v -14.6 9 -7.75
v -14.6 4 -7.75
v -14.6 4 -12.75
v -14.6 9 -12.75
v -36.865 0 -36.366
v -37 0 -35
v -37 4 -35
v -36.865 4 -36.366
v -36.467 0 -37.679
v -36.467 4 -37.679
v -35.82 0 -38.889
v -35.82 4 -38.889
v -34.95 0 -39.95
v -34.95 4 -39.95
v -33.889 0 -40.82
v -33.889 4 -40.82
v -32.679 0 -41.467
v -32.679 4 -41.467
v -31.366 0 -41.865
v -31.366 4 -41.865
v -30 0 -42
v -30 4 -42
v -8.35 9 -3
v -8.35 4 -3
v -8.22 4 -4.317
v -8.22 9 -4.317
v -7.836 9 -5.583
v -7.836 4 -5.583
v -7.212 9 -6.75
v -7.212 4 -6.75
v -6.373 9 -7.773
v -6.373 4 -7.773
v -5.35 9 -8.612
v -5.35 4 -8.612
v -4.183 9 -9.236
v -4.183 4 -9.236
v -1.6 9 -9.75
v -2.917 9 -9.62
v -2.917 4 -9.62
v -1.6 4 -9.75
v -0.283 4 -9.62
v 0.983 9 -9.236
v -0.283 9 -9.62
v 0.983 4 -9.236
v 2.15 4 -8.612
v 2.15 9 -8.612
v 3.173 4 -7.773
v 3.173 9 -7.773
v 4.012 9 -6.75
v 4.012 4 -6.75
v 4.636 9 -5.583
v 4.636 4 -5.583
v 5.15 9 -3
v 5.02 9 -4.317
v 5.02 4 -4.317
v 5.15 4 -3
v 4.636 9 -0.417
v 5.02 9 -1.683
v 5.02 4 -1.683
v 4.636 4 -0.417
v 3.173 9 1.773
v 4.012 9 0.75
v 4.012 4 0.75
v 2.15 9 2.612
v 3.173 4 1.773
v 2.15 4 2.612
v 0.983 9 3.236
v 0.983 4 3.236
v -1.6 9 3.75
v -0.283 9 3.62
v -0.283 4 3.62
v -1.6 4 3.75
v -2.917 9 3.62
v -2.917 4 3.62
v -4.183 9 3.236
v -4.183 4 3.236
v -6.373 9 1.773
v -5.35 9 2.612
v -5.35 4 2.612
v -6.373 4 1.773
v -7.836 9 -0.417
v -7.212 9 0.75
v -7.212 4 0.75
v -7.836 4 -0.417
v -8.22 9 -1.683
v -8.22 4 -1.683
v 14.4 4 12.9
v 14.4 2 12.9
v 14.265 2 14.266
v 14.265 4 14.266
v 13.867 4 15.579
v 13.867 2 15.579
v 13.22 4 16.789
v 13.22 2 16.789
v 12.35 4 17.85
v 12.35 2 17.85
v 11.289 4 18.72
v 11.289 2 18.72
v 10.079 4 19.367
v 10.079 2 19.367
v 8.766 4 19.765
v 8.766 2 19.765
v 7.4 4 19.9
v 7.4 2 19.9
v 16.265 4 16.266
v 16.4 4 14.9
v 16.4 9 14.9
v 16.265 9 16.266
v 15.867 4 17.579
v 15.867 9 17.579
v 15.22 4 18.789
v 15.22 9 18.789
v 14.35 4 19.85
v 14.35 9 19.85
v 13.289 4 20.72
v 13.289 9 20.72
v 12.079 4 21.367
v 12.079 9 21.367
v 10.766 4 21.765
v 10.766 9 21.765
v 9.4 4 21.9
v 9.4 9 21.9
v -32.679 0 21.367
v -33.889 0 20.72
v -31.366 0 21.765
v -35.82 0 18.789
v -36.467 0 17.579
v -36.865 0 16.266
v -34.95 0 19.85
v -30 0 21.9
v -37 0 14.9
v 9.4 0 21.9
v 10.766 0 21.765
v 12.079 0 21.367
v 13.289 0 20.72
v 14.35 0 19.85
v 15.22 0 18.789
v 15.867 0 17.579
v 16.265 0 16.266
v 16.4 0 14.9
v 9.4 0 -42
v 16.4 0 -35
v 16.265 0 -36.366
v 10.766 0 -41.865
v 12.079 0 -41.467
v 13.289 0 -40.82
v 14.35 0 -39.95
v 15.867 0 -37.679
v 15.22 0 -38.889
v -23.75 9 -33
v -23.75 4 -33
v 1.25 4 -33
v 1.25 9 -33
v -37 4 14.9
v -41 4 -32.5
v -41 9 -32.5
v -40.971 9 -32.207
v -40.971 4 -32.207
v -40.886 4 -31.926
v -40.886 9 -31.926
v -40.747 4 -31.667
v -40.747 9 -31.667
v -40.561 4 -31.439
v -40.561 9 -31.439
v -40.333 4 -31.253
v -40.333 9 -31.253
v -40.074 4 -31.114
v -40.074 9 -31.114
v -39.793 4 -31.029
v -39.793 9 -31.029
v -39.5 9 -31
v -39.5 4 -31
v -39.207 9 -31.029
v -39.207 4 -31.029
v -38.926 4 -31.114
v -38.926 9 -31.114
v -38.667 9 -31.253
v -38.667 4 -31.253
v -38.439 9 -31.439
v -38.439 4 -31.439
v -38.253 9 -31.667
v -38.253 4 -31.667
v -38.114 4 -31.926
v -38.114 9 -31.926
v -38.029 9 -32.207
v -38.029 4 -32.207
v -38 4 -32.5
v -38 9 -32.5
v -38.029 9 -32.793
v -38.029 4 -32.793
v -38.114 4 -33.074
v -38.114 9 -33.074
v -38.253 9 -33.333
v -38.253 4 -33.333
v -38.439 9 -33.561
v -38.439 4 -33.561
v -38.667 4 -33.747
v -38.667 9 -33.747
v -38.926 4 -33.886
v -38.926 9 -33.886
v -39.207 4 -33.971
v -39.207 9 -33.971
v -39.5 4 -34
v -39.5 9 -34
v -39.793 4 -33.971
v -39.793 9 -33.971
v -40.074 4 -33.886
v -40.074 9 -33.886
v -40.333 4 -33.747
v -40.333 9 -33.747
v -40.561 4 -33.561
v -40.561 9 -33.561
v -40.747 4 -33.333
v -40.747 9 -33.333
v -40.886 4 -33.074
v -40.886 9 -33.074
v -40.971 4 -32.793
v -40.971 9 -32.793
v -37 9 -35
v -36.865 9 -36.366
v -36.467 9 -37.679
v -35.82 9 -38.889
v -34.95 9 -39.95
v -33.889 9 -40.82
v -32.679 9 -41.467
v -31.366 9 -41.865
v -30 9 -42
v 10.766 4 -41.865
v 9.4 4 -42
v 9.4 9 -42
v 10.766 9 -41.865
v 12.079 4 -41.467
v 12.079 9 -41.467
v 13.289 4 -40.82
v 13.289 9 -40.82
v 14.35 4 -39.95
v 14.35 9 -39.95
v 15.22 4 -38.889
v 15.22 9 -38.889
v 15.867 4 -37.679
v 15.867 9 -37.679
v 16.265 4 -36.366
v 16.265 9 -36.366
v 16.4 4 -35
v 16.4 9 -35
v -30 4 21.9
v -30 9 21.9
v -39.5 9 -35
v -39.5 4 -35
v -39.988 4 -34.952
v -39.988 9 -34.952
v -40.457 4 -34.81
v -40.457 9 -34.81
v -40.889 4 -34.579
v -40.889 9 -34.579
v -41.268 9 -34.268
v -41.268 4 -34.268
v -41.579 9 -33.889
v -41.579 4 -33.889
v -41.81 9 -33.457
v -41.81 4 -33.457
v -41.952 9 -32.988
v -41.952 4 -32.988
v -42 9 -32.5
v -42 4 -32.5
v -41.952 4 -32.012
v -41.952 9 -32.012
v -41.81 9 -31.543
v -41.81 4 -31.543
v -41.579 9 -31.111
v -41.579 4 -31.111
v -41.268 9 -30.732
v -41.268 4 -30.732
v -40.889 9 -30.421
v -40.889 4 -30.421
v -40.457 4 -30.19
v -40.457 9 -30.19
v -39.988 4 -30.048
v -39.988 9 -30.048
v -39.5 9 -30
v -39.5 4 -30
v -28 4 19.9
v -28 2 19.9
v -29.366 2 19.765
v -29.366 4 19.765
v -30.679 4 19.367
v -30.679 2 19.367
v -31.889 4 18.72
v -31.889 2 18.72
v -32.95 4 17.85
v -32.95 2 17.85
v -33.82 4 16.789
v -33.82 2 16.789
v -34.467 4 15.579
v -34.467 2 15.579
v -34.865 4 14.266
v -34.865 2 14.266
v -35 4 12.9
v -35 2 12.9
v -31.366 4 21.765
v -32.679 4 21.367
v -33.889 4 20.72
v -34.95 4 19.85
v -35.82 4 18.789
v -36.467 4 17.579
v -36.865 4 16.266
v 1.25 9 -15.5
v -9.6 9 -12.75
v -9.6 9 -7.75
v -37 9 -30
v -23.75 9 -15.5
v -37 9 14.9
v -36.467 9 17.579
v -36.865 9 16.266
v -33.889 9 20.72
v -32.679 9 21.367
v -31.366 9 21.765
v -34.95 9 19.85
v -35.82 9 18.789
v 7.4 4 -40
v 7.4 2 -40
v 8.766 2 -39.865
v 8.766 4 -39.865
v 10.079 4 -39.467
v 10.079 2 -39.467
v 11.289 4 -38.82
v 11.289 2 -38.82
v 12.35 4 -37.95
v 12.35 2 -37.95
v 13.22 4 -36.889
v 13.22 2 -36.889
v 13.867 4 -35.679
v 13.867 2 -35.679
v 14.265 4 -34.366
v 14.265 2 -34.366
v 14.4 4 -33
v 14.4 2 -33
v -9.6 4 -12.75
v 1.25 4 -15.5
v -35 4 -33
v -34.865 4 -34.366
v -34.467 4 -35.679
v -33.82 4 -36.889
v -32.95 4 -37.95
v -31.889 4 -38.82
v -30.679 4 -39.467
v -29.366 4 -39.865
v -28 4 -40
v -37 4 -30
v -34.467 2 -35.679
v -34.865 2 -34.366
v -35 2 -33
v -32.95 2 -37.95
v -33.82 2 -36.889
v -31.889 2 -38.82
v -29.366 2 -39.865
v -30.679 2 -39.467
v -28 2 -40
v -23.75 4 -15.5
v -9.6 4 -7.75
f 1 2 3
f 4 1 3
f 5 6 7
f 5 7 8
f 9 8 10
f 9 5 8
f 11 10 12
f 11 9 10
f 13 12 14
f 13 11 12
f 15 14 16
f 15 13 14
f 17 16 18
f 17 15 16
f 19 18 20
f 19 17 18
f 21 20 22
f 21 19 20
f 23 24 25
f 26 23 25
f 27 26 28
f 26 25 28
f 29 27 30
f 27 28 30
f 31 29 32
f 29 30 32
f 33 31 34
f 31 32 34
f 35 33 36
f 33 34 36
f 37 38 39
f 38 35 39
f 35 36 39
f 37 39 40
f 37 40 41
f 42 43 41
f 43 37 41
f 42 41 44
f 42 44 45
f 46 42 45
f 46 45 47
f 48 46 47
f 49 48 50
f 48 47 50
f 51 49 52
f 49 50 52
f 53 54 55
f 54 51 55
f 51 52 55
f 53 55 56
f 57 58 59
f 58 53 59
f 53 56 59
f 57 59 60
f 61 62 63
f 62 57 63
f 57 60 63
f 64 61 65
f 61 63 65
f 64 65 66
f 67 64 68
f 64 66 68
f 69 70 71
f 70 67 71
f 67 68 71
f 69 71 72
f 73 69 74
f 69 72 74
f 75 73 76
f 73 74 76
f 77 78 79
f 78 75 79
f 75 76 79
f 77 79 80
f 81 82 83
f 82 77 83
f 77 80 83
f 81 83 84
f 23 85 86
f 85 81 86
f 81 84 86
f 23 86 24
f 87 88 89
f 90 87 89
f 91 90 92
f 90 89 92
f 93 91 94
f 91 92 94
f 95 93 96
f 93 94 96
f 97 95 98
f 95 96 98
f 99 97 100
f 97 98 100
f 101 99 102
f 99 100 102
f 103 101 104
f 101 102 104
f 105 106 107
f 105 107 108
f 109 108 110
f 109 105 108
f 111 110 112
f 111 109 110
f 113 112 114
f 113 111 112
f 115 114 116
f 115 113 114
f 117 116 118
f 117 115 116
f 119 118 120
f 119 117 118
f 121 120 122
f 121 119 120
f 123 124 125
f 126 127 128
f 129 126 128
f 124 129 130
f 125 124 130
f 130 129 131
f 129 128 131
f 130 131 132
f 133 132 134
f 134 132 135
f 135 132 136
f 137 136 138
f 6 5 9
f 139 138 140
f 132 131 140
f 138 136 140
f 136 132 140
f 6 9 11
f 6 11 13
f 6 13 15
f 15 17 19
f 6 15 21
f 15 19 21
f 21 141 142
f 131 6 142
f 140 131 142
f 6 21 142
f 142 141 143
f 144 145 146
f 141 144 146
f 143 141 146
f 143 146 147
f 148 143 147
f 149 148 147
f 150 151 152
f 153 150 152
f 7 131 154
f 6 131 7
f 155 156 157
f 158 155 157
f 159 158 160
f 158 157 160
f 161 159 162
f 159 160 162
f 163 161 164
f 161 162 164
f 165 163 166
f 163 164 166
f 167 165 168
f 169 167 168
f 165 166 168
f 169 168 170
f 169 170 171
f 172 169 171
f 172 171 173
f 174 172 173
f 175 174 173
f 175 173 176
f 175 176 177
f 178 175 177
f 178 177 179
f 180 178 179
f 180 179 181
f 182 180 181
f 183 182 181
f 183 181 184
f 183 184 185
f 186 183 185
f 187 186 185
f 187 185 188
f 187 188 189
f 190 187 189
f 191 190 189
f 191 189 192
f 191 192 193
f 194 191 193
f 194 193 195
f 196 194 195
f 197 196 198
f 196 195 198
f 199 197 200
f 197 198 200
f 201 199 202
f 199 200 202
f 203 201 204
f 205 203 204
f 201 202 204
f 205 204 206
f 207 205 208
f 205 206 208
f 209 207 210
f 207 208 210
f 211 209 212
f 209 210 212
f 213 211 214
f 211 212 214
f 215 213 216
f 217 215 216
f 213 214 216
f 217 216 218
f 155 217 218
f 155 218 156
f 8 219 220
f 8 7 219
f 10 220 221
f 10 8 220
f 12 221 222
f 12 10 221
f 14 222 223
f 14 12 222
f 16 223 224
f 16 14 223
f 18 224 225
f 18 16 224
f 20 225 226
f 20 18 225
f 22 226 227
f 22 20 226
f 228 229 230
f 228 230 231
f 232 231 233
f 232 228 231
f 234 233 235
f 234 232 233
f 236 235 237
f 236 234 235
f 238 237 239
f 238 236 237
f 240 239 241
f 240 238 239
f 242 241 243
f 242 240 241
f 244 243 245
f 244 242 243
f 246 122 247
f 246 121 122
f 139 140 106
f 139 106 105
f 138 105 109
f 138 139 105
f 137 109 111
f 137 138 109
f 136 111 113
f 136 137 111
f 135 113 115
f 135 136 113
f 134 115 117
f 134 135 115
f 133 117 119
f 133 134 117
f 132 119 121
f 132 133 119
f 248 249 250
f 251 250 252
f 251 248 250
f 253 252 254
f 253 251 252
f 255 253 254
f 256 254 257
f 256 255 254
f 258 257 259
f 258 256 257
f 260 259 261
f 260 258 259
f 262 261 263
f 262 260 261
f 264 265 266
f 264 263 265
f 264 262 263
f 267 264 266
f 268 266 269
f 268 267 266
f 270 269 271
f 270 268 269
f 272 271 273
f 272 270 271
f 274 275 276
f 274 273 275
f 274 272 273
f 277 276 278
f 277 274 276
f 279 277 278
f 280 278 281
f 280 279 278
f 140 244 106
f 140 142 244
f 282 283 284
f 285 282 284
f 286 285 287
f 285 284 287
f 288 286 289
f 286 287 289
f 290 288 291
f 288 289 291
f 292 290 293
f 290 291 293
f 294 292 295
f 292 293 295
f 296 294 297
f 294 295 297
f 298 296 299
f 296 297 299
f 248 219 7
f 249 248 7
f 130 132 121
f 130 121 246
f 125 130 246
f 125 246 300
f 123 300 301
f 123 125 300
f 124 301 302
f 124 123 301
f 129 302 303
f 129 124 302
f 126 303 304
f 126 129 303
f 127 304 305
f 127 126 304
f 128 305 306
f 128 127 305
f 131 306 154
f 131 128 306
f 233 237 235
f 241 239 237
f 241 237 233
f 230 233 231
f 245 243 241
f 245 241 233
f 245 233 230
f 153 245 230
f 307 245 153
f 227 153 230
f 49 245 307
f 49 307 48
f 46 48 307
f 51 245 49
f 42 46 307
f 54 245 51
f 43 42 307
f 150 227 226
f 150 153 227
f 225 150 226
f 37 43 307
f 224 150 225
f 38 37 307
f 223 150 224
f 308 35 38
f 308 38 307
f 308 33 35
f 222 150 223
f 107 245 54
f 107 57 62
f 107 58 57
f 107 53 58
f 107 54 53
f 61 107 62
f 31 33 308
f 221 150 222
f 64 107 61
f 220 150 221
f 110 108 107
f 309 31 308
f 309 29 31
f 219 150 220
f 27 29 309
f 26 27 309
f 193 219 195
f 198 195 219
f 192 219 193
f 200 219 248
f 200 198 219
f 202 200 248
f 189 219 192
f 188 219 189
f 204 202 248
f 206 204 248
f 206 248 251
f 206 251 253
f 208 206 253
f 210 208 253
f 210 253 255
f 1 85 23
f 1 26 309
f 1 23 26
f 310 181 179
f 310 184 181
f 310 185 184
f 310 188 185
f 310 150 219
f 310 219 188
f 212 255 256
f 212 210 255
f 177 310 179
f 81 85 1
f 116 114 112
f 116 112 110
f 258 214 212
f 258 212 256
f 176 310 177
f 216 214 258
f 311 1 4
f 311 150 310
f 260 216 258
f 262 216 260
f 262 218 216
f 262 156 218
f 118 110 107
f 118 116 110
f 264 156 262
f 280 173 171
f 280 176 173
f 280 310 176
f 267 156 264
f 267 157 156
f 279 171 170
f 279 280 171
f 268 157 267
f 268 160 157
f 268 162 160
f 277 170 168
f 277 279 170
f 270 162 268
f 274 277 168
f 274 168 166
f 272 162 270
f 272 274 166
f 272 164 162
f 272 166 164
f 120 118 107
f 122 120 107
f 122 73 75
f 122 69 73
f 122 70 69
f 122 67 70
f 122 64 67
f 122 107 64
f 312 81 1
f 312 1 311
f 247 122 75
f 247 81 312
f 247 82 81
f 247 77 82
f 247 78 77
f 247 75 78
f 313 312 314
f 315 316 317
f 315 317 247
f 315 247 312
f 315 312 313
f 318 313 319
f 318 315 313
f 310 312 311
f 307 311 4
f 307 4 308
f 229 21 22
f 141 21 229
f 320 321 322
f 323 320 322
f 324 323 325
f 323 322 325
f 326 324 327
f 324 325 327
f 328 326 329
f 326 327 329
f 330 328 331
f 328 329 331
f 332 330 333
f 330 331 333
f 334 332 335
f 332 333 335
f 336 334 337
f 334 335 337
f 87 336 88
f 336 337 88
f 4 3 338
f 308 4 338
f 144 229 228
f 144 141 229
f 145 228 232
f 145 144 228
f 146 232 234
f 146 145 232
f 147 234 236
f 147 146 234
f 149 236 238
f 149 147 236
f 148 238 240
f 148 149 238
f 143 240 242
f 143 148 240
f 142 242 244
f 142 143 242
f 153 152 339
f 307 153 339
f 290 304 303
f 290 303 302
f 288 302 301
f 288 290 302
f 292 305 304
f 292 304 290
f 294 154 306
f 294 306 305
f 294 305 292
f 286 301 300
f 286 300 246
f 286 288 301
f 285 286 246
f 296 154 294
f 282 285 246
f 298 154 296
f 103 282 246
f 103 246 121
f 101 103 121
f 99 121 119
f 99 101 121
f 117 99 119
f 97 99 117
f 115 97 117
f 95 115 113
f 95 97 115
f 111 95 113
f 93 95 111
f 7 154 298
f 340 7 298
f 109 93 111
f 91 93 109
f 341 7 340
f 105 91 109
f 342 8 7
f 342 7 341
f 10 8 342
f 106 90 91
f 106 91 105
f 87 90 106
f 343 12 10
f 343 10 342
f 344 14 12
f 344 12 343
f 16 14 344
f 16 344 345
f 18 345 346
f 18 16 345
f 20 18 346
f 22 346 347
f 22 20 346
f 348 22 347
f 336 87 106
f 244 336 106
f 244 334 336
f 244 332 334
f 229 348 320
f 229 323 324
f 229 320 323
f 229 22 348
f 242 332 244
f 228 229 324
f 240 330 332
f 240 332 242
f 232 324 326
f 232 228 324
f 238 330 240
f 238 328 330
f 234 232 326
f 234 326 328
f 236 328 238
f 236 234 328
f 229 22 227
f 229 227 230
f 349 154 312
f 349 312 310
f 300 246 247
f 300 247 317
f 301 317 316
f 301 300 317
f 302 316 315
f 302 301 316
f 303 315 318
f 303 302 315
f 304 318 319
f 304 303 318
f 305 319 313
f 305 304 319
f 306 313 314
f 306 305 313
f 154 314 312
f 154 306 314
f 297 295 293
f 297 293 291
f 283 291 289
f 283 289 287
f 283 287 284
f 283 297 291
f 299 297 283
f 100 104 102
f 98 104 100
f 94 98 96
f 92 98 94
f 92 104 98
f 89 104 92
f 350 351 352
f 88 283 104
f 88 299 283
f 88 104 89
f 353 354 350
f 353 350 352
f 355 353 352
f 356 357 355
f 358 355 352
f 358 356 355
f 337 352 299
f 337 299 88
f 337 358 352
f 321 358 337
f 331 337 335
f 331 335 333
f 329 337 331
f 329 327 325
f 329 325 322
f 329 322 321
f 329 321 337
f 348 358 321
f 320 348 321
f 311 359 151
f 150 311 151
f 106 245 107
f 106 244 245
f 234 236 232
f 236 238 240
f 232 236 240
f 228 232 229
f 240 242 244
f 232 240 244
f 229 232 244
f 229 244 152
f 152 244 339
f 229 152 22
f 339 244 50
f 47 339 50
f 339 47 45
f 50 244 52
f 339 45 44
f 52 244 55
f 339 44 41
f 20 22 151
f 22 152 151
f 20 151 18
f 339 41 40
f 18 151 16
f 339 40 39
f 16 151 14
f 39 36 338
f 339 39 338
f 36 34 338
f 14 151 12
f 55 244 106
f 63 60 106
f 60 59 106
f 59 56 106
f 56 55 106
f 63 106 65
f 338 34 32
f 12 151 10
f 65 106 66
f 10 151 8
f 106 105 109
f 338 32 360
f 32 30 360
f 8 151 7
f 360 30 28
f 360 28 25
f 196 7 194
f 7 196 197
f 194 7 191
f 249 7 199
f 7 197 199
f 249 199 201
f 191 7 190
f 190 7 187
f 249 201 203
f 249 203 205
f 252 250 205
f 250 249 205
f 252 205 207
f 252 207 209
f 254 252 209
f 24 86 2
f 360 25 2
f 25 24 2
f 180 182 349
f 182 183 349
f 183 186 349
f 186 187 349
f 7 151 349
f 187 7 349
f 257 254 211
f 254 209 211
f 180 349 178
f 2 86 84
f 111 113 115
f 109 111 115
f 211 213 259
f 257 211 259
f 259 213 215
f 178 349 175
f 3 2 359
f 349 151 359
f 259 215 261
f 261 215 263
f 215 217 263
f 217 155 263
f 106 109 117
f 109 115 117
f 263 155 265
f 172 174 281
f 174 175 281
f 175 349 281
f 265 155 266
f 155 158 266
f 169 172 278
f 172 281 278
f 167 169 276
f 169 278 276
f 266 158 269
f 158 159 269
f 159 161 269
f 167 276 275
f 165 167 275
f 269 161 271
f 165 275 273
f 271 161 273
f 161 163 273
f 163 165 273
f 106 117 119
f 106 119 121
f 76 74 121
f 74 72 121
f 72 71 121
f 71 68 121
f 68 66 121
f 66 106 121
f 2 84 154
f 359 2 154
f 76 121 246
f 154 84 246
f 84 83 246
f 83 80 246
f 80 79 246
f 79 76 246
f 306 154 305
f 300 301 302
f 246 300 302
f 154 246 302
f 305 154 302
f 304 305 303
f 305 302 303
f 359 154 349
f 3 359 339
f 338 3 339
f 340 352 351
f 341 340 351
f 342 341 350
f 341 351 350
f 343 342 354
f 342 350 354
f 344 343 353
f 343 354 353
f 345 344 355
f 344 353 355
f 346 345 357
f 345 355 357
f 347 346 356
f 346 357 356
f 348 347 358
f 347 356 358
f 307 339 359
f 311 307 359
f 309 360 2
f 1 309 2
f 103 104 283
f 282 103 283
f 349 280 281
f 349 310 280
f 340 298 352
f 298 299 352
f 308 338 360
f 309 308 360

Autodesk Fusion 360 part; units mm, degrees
sketch "Sketch1" plane through (0, 0, 0) normal (0, 1, 0) x (1, 0, 0)
  line L0 (-28, 40) -> (7.4, 40)
  line L1 (14.4, 33) -> (14.4, -12.9)
  line L2 (7.4, -19.9) -> (-28, -19.9)
  line L3 (-35, -12.9) -> (-35, 33)
  arc A0 (14.4, 33) -> (7.4, 40) centre (7.4, 33) ccw
  arc A1 (7.4, -19.9) -> (14.4, -12.9) centre (7.4, -12.9) ccw
  arc A2 (-28, 40) -> (-35, 33) centre (-28, 33) ccw
  arc A3 (-35, -12.9) -> (-28, -19.9) centre (-28, -12.9) ccw
  line L4 (-30, 42) -> (9.4, 42)
  line L5 (16.4, 35) -> (16.4, -14.9)
  line L6 (9.4, -21.9) -> (-30, -21.9)
  line L7 (-37, -14.9) -> (-37, 35)
  arc A4 (-30, 42) -> (-37, 35) centre (-30, 35) ccw
  arc A5 (16.4, 35) -> (9.4, 42) centre (9.4, 35) ccw
  arc A6 (9.4, -21.9) -> (16.4, -14.9) centre (9.4, -14.9) ccw
  arc A7 (-37, -14.9) -> (-30, -21.9) centre (-30, -14.9) ccw
  point P0 (-35, 40)
  point P1 (14.4, 40)
  point P2 (-35, -19.9)
  dimension "d1" = 59.9
  dimension "d2" = 49.4
  dimension "d3" = 7
  dimension "d4" = 7
  dimension "d5" = 7
  dimension "d6" = 7
  dimension "d7" = 2
  dimension "d8" = 2
  dimension "d9" = 2
  dimension "d10" = 2
  dimension "d11" = 7
  dimension "d12" = 7
  dimension "d13" = 7
  dimension "d14" = 7
extrude "Extrude1" add sketch "Sketch1" along normal blind 2 contours L0 L1 L2 L3 A0 A1 A2 A3 makes body 1
extrude "Extrude2" add sketch "Sketch1" along normal blind 4 bodies 1
sketch "Sketch2" plane through (0, 0, 21.9) normal (0, 0, 1) x (1, 0, 0)
  line L0 (-30, 0) -> (9.4, 0)
  line L1 (9.4, 0) -> (9.4, 4)
  line L2 (9.4, 4) -> (-30, 4)
  line L3 (-30, 4) -> (-30, 0)
  line L4 (-27, 8) -> (-18, 8)
  line L5 (-18, 8) -> (-18, 4.5)
  line L6 (-18, 4.5) -> (-27, 4.5)
  line L7 (-27, 4.5) -> (-27, 8)
  line L8 (9.4, 0) -> (-30, 0)
  dimension "d19" = 9
  dimension "d20" = 3.5
  dimension "d21" = 4.5
  dimension "d22" = 3
sketch "Sketch5" plane through (0, 2, 0) normal (0, 1, 0) x (-1, 0, 0)
  arc A0 (28, -40) -> (35, -33) centre (28, -33) ccw
  line L0 (35, -33) -> (35, 12.9)
  arc A1 (35, 12.9) -> (28, 19.9) centre (28, 12.9) ccw
  line L1 (28, 19.9) -> (-7.4, 19.9)
  arc A2 (-7.4, 19.9) -> (-14.4, 12.9) centre (-7.4, 12.9) ccw
  line L2 (-14.4, 12.9) -> (-14.4, -33)
  arc A3 (-14.4, -33) -> (-7.4, -40) centre (-7.4, -33) ccw
  line L3 (-7.4, -40) -> (28, -40)
  line L4 (23.75, -33) -> (-1.25, -33)
  line L5 (-1.25, -33) -> (-1.25, -15.5)
  line L6 (-1.25, -15.5) -> (23.75, -15.5)
  line L7 (23.75, -15.5) -> (23.75, -33)
  line L8 (14.6, -12.75) -> (9.6, -12.75)
  line L9 (9.6, -12.75) -> (9.6, -7.75)
  line L10 (9.6, -7.75) -> (14.6, -7.75)
  line L11 (14.6, -7.75) -> (14.6, -12.75)
  line L12 (-14.4, -33) -> (-14.4, 12.9)
  line L13 (28, -40) -> (-7.4, -40)
  line L14 (35, 12.9) -> (35, -33)
  circle A4 centre (1.6, -3) radius 6.75
  line L15 (30, -42) -> (-9.4, -42)
  line L16 (-16.4, -35) -> (-16.4, 14.9)
  line L17 (-9.4, 21.9) -> (30, 21.9)
  line L18 (37, 14.9) -> (37, -35)
  line L19 (-7.4, 19.9) -> (28, 19.9)
  arc A5 (30, -42) -> (37, -35) centre (30, -35) ccw
  arc A6 (-16.4, -35) -> (-9.4, -42) centre (-9.4, -35) ccw
  arc A7 (-9.4, 21.9) -> (-16.4, 14.9) centre (-9.4, 14.9) ccw
  arc A8 (37, 14.9) -> (30, 21.9) centre (30, 14.9) ccw
  dimension "d34" = 25
  dimension "d35" = 5
  dimension "d36" = 5
  dimension "d37" = 24
  dimension "d39" = 17.5
  dimension "d41" = 7
  dimension "d42" = 27.25
  dimension "d43" = 11.25
  dimension "d47" = 13.5
  dimension "d48" = 37
  dimension "d49" = 16
  dimension "d53" = 2
  dimension "d54" = 2
  dimension "d55" = 2
  dimension "d56" = 2
  dimension "d57" = 7
  dimension "d58" = 7
  dimension "d59" = 7
  dimension "d60" = 7
extrude "Extrude8" add sketch "Sketch5" along normal blind 5 from surface at 2 separate body contours A0 L0 A1 L1 A2 L2 A3 L3 L12 L13 L14 L19 | L15 L16 L17 L18 A5 A6 A7 A8 makes body 2
sketch "Sketch10" plane through (-37, 0, 0) normal (-1, 0, 0) x (0, 0, 1)
  line L0 (-35, 4) -> (14.9, 4)
  line L1 (14.9, 4) -> (14.9, 9)
  line L2 (14.9, 9) -> (-35, 9)
  line L3 (-35, 9) -> (-35, 4)
  line L4 (-35, 9) -> (-30, 9)
  line L5 (-30, 9) -> (-30, 4)
  line L6 (-30, 4) -> (-35, 4)
  line L7 (-35, 4) -> (-35, 9)
  dimension "d80" = 5
  dimension "d81" = 5
extrude "Extrude13" add sketch "Sketch10" along normal blind 5 contours L0 L2 L3 L4 L5 L6 L7 bodies 2
sketch "Sketch11" plane through (0, 9, 0) normal (0, 1, 0) x (-1, 0, 0)
  line L0 (37, -35) -> (42, -35)
  line L1 (42, -35) -> (42, -30)
  line L2 (42, -30) -> (37, -30)
  line L3 (39.5, -35) -> (37, -35)
  line L4 (37, -35) -> (37, -30)
  line L5 (37, -30) -> (39.5, -30)
  circle A0 centre (39.5, -32.5) radius 1.5
  arc A1 (39.5, -35) -> (42, -32.5) centre (39.5, -32.5) ccw
  arc A2 (42, -32.5) -> (39.5, -30) centre (39.5, -32.5) ccw
  line L6 (-1.25, -15.5) -> (23.75, -15.5)
  line L7 (23.75, -15.5) -> (23.75, -33)
  line L8 (23.75, -33) -> (-1.25, -33)
  line L9 (-1.25, -33) -> (-1.25, -15.5)
  line L10 (9.6, -7.75) -> (14.6, -7.75)
  line L11 (14.6, -7.75) -> (14.6, -12.75)
  line L12 (14.6, -12.75) -> (9.6, -12.75)
  line L13 (9.6, -12.75) -> (9.6, -7.75)
  circle A3 centre (1.6, -3) radius 6.75
  arc A4 (30, -42) -> (37, -35) centre (30, -35) ccw
  line L14 (37, -30) -> (37, 14.9)
  arc A5 (37, 14.9) -> (30, 21.9) centre (30, 14.9) ccw
  line L15 (30, 21.9) -> (-9.4, 21.9)
  arc A6 (-9.4, 21.9) -> (-16.4, 14.9) centre (-9.4, 14.9) ccw
  line L16 (-16.4, 14.9) -> (-16.4, -35)
  arc A7 (-16.4, -35) -> (-9.4, -42) centre (-9.4, -35) ccw
  line L17 (-9.4, -42) -> (30, -42)
  dimension "d84" = 3
  dimension "d85" = 2.5
  dimension "d86" = 2.5
extrude "Extrude14" cut sketch "Sketch11" against normal blind 5 contours L0 L1 A1 | L1 L2 A2 | A0 bodies 1 2
equation "d1 = 59.5 mm + 0.4 mm"
equation "d2 = 49 mm + 0.4 mm"
equation "d41 = 2.2 mm + 4.8 mm"
equation "d43 = 8.75 mm + 2.5 mm"
